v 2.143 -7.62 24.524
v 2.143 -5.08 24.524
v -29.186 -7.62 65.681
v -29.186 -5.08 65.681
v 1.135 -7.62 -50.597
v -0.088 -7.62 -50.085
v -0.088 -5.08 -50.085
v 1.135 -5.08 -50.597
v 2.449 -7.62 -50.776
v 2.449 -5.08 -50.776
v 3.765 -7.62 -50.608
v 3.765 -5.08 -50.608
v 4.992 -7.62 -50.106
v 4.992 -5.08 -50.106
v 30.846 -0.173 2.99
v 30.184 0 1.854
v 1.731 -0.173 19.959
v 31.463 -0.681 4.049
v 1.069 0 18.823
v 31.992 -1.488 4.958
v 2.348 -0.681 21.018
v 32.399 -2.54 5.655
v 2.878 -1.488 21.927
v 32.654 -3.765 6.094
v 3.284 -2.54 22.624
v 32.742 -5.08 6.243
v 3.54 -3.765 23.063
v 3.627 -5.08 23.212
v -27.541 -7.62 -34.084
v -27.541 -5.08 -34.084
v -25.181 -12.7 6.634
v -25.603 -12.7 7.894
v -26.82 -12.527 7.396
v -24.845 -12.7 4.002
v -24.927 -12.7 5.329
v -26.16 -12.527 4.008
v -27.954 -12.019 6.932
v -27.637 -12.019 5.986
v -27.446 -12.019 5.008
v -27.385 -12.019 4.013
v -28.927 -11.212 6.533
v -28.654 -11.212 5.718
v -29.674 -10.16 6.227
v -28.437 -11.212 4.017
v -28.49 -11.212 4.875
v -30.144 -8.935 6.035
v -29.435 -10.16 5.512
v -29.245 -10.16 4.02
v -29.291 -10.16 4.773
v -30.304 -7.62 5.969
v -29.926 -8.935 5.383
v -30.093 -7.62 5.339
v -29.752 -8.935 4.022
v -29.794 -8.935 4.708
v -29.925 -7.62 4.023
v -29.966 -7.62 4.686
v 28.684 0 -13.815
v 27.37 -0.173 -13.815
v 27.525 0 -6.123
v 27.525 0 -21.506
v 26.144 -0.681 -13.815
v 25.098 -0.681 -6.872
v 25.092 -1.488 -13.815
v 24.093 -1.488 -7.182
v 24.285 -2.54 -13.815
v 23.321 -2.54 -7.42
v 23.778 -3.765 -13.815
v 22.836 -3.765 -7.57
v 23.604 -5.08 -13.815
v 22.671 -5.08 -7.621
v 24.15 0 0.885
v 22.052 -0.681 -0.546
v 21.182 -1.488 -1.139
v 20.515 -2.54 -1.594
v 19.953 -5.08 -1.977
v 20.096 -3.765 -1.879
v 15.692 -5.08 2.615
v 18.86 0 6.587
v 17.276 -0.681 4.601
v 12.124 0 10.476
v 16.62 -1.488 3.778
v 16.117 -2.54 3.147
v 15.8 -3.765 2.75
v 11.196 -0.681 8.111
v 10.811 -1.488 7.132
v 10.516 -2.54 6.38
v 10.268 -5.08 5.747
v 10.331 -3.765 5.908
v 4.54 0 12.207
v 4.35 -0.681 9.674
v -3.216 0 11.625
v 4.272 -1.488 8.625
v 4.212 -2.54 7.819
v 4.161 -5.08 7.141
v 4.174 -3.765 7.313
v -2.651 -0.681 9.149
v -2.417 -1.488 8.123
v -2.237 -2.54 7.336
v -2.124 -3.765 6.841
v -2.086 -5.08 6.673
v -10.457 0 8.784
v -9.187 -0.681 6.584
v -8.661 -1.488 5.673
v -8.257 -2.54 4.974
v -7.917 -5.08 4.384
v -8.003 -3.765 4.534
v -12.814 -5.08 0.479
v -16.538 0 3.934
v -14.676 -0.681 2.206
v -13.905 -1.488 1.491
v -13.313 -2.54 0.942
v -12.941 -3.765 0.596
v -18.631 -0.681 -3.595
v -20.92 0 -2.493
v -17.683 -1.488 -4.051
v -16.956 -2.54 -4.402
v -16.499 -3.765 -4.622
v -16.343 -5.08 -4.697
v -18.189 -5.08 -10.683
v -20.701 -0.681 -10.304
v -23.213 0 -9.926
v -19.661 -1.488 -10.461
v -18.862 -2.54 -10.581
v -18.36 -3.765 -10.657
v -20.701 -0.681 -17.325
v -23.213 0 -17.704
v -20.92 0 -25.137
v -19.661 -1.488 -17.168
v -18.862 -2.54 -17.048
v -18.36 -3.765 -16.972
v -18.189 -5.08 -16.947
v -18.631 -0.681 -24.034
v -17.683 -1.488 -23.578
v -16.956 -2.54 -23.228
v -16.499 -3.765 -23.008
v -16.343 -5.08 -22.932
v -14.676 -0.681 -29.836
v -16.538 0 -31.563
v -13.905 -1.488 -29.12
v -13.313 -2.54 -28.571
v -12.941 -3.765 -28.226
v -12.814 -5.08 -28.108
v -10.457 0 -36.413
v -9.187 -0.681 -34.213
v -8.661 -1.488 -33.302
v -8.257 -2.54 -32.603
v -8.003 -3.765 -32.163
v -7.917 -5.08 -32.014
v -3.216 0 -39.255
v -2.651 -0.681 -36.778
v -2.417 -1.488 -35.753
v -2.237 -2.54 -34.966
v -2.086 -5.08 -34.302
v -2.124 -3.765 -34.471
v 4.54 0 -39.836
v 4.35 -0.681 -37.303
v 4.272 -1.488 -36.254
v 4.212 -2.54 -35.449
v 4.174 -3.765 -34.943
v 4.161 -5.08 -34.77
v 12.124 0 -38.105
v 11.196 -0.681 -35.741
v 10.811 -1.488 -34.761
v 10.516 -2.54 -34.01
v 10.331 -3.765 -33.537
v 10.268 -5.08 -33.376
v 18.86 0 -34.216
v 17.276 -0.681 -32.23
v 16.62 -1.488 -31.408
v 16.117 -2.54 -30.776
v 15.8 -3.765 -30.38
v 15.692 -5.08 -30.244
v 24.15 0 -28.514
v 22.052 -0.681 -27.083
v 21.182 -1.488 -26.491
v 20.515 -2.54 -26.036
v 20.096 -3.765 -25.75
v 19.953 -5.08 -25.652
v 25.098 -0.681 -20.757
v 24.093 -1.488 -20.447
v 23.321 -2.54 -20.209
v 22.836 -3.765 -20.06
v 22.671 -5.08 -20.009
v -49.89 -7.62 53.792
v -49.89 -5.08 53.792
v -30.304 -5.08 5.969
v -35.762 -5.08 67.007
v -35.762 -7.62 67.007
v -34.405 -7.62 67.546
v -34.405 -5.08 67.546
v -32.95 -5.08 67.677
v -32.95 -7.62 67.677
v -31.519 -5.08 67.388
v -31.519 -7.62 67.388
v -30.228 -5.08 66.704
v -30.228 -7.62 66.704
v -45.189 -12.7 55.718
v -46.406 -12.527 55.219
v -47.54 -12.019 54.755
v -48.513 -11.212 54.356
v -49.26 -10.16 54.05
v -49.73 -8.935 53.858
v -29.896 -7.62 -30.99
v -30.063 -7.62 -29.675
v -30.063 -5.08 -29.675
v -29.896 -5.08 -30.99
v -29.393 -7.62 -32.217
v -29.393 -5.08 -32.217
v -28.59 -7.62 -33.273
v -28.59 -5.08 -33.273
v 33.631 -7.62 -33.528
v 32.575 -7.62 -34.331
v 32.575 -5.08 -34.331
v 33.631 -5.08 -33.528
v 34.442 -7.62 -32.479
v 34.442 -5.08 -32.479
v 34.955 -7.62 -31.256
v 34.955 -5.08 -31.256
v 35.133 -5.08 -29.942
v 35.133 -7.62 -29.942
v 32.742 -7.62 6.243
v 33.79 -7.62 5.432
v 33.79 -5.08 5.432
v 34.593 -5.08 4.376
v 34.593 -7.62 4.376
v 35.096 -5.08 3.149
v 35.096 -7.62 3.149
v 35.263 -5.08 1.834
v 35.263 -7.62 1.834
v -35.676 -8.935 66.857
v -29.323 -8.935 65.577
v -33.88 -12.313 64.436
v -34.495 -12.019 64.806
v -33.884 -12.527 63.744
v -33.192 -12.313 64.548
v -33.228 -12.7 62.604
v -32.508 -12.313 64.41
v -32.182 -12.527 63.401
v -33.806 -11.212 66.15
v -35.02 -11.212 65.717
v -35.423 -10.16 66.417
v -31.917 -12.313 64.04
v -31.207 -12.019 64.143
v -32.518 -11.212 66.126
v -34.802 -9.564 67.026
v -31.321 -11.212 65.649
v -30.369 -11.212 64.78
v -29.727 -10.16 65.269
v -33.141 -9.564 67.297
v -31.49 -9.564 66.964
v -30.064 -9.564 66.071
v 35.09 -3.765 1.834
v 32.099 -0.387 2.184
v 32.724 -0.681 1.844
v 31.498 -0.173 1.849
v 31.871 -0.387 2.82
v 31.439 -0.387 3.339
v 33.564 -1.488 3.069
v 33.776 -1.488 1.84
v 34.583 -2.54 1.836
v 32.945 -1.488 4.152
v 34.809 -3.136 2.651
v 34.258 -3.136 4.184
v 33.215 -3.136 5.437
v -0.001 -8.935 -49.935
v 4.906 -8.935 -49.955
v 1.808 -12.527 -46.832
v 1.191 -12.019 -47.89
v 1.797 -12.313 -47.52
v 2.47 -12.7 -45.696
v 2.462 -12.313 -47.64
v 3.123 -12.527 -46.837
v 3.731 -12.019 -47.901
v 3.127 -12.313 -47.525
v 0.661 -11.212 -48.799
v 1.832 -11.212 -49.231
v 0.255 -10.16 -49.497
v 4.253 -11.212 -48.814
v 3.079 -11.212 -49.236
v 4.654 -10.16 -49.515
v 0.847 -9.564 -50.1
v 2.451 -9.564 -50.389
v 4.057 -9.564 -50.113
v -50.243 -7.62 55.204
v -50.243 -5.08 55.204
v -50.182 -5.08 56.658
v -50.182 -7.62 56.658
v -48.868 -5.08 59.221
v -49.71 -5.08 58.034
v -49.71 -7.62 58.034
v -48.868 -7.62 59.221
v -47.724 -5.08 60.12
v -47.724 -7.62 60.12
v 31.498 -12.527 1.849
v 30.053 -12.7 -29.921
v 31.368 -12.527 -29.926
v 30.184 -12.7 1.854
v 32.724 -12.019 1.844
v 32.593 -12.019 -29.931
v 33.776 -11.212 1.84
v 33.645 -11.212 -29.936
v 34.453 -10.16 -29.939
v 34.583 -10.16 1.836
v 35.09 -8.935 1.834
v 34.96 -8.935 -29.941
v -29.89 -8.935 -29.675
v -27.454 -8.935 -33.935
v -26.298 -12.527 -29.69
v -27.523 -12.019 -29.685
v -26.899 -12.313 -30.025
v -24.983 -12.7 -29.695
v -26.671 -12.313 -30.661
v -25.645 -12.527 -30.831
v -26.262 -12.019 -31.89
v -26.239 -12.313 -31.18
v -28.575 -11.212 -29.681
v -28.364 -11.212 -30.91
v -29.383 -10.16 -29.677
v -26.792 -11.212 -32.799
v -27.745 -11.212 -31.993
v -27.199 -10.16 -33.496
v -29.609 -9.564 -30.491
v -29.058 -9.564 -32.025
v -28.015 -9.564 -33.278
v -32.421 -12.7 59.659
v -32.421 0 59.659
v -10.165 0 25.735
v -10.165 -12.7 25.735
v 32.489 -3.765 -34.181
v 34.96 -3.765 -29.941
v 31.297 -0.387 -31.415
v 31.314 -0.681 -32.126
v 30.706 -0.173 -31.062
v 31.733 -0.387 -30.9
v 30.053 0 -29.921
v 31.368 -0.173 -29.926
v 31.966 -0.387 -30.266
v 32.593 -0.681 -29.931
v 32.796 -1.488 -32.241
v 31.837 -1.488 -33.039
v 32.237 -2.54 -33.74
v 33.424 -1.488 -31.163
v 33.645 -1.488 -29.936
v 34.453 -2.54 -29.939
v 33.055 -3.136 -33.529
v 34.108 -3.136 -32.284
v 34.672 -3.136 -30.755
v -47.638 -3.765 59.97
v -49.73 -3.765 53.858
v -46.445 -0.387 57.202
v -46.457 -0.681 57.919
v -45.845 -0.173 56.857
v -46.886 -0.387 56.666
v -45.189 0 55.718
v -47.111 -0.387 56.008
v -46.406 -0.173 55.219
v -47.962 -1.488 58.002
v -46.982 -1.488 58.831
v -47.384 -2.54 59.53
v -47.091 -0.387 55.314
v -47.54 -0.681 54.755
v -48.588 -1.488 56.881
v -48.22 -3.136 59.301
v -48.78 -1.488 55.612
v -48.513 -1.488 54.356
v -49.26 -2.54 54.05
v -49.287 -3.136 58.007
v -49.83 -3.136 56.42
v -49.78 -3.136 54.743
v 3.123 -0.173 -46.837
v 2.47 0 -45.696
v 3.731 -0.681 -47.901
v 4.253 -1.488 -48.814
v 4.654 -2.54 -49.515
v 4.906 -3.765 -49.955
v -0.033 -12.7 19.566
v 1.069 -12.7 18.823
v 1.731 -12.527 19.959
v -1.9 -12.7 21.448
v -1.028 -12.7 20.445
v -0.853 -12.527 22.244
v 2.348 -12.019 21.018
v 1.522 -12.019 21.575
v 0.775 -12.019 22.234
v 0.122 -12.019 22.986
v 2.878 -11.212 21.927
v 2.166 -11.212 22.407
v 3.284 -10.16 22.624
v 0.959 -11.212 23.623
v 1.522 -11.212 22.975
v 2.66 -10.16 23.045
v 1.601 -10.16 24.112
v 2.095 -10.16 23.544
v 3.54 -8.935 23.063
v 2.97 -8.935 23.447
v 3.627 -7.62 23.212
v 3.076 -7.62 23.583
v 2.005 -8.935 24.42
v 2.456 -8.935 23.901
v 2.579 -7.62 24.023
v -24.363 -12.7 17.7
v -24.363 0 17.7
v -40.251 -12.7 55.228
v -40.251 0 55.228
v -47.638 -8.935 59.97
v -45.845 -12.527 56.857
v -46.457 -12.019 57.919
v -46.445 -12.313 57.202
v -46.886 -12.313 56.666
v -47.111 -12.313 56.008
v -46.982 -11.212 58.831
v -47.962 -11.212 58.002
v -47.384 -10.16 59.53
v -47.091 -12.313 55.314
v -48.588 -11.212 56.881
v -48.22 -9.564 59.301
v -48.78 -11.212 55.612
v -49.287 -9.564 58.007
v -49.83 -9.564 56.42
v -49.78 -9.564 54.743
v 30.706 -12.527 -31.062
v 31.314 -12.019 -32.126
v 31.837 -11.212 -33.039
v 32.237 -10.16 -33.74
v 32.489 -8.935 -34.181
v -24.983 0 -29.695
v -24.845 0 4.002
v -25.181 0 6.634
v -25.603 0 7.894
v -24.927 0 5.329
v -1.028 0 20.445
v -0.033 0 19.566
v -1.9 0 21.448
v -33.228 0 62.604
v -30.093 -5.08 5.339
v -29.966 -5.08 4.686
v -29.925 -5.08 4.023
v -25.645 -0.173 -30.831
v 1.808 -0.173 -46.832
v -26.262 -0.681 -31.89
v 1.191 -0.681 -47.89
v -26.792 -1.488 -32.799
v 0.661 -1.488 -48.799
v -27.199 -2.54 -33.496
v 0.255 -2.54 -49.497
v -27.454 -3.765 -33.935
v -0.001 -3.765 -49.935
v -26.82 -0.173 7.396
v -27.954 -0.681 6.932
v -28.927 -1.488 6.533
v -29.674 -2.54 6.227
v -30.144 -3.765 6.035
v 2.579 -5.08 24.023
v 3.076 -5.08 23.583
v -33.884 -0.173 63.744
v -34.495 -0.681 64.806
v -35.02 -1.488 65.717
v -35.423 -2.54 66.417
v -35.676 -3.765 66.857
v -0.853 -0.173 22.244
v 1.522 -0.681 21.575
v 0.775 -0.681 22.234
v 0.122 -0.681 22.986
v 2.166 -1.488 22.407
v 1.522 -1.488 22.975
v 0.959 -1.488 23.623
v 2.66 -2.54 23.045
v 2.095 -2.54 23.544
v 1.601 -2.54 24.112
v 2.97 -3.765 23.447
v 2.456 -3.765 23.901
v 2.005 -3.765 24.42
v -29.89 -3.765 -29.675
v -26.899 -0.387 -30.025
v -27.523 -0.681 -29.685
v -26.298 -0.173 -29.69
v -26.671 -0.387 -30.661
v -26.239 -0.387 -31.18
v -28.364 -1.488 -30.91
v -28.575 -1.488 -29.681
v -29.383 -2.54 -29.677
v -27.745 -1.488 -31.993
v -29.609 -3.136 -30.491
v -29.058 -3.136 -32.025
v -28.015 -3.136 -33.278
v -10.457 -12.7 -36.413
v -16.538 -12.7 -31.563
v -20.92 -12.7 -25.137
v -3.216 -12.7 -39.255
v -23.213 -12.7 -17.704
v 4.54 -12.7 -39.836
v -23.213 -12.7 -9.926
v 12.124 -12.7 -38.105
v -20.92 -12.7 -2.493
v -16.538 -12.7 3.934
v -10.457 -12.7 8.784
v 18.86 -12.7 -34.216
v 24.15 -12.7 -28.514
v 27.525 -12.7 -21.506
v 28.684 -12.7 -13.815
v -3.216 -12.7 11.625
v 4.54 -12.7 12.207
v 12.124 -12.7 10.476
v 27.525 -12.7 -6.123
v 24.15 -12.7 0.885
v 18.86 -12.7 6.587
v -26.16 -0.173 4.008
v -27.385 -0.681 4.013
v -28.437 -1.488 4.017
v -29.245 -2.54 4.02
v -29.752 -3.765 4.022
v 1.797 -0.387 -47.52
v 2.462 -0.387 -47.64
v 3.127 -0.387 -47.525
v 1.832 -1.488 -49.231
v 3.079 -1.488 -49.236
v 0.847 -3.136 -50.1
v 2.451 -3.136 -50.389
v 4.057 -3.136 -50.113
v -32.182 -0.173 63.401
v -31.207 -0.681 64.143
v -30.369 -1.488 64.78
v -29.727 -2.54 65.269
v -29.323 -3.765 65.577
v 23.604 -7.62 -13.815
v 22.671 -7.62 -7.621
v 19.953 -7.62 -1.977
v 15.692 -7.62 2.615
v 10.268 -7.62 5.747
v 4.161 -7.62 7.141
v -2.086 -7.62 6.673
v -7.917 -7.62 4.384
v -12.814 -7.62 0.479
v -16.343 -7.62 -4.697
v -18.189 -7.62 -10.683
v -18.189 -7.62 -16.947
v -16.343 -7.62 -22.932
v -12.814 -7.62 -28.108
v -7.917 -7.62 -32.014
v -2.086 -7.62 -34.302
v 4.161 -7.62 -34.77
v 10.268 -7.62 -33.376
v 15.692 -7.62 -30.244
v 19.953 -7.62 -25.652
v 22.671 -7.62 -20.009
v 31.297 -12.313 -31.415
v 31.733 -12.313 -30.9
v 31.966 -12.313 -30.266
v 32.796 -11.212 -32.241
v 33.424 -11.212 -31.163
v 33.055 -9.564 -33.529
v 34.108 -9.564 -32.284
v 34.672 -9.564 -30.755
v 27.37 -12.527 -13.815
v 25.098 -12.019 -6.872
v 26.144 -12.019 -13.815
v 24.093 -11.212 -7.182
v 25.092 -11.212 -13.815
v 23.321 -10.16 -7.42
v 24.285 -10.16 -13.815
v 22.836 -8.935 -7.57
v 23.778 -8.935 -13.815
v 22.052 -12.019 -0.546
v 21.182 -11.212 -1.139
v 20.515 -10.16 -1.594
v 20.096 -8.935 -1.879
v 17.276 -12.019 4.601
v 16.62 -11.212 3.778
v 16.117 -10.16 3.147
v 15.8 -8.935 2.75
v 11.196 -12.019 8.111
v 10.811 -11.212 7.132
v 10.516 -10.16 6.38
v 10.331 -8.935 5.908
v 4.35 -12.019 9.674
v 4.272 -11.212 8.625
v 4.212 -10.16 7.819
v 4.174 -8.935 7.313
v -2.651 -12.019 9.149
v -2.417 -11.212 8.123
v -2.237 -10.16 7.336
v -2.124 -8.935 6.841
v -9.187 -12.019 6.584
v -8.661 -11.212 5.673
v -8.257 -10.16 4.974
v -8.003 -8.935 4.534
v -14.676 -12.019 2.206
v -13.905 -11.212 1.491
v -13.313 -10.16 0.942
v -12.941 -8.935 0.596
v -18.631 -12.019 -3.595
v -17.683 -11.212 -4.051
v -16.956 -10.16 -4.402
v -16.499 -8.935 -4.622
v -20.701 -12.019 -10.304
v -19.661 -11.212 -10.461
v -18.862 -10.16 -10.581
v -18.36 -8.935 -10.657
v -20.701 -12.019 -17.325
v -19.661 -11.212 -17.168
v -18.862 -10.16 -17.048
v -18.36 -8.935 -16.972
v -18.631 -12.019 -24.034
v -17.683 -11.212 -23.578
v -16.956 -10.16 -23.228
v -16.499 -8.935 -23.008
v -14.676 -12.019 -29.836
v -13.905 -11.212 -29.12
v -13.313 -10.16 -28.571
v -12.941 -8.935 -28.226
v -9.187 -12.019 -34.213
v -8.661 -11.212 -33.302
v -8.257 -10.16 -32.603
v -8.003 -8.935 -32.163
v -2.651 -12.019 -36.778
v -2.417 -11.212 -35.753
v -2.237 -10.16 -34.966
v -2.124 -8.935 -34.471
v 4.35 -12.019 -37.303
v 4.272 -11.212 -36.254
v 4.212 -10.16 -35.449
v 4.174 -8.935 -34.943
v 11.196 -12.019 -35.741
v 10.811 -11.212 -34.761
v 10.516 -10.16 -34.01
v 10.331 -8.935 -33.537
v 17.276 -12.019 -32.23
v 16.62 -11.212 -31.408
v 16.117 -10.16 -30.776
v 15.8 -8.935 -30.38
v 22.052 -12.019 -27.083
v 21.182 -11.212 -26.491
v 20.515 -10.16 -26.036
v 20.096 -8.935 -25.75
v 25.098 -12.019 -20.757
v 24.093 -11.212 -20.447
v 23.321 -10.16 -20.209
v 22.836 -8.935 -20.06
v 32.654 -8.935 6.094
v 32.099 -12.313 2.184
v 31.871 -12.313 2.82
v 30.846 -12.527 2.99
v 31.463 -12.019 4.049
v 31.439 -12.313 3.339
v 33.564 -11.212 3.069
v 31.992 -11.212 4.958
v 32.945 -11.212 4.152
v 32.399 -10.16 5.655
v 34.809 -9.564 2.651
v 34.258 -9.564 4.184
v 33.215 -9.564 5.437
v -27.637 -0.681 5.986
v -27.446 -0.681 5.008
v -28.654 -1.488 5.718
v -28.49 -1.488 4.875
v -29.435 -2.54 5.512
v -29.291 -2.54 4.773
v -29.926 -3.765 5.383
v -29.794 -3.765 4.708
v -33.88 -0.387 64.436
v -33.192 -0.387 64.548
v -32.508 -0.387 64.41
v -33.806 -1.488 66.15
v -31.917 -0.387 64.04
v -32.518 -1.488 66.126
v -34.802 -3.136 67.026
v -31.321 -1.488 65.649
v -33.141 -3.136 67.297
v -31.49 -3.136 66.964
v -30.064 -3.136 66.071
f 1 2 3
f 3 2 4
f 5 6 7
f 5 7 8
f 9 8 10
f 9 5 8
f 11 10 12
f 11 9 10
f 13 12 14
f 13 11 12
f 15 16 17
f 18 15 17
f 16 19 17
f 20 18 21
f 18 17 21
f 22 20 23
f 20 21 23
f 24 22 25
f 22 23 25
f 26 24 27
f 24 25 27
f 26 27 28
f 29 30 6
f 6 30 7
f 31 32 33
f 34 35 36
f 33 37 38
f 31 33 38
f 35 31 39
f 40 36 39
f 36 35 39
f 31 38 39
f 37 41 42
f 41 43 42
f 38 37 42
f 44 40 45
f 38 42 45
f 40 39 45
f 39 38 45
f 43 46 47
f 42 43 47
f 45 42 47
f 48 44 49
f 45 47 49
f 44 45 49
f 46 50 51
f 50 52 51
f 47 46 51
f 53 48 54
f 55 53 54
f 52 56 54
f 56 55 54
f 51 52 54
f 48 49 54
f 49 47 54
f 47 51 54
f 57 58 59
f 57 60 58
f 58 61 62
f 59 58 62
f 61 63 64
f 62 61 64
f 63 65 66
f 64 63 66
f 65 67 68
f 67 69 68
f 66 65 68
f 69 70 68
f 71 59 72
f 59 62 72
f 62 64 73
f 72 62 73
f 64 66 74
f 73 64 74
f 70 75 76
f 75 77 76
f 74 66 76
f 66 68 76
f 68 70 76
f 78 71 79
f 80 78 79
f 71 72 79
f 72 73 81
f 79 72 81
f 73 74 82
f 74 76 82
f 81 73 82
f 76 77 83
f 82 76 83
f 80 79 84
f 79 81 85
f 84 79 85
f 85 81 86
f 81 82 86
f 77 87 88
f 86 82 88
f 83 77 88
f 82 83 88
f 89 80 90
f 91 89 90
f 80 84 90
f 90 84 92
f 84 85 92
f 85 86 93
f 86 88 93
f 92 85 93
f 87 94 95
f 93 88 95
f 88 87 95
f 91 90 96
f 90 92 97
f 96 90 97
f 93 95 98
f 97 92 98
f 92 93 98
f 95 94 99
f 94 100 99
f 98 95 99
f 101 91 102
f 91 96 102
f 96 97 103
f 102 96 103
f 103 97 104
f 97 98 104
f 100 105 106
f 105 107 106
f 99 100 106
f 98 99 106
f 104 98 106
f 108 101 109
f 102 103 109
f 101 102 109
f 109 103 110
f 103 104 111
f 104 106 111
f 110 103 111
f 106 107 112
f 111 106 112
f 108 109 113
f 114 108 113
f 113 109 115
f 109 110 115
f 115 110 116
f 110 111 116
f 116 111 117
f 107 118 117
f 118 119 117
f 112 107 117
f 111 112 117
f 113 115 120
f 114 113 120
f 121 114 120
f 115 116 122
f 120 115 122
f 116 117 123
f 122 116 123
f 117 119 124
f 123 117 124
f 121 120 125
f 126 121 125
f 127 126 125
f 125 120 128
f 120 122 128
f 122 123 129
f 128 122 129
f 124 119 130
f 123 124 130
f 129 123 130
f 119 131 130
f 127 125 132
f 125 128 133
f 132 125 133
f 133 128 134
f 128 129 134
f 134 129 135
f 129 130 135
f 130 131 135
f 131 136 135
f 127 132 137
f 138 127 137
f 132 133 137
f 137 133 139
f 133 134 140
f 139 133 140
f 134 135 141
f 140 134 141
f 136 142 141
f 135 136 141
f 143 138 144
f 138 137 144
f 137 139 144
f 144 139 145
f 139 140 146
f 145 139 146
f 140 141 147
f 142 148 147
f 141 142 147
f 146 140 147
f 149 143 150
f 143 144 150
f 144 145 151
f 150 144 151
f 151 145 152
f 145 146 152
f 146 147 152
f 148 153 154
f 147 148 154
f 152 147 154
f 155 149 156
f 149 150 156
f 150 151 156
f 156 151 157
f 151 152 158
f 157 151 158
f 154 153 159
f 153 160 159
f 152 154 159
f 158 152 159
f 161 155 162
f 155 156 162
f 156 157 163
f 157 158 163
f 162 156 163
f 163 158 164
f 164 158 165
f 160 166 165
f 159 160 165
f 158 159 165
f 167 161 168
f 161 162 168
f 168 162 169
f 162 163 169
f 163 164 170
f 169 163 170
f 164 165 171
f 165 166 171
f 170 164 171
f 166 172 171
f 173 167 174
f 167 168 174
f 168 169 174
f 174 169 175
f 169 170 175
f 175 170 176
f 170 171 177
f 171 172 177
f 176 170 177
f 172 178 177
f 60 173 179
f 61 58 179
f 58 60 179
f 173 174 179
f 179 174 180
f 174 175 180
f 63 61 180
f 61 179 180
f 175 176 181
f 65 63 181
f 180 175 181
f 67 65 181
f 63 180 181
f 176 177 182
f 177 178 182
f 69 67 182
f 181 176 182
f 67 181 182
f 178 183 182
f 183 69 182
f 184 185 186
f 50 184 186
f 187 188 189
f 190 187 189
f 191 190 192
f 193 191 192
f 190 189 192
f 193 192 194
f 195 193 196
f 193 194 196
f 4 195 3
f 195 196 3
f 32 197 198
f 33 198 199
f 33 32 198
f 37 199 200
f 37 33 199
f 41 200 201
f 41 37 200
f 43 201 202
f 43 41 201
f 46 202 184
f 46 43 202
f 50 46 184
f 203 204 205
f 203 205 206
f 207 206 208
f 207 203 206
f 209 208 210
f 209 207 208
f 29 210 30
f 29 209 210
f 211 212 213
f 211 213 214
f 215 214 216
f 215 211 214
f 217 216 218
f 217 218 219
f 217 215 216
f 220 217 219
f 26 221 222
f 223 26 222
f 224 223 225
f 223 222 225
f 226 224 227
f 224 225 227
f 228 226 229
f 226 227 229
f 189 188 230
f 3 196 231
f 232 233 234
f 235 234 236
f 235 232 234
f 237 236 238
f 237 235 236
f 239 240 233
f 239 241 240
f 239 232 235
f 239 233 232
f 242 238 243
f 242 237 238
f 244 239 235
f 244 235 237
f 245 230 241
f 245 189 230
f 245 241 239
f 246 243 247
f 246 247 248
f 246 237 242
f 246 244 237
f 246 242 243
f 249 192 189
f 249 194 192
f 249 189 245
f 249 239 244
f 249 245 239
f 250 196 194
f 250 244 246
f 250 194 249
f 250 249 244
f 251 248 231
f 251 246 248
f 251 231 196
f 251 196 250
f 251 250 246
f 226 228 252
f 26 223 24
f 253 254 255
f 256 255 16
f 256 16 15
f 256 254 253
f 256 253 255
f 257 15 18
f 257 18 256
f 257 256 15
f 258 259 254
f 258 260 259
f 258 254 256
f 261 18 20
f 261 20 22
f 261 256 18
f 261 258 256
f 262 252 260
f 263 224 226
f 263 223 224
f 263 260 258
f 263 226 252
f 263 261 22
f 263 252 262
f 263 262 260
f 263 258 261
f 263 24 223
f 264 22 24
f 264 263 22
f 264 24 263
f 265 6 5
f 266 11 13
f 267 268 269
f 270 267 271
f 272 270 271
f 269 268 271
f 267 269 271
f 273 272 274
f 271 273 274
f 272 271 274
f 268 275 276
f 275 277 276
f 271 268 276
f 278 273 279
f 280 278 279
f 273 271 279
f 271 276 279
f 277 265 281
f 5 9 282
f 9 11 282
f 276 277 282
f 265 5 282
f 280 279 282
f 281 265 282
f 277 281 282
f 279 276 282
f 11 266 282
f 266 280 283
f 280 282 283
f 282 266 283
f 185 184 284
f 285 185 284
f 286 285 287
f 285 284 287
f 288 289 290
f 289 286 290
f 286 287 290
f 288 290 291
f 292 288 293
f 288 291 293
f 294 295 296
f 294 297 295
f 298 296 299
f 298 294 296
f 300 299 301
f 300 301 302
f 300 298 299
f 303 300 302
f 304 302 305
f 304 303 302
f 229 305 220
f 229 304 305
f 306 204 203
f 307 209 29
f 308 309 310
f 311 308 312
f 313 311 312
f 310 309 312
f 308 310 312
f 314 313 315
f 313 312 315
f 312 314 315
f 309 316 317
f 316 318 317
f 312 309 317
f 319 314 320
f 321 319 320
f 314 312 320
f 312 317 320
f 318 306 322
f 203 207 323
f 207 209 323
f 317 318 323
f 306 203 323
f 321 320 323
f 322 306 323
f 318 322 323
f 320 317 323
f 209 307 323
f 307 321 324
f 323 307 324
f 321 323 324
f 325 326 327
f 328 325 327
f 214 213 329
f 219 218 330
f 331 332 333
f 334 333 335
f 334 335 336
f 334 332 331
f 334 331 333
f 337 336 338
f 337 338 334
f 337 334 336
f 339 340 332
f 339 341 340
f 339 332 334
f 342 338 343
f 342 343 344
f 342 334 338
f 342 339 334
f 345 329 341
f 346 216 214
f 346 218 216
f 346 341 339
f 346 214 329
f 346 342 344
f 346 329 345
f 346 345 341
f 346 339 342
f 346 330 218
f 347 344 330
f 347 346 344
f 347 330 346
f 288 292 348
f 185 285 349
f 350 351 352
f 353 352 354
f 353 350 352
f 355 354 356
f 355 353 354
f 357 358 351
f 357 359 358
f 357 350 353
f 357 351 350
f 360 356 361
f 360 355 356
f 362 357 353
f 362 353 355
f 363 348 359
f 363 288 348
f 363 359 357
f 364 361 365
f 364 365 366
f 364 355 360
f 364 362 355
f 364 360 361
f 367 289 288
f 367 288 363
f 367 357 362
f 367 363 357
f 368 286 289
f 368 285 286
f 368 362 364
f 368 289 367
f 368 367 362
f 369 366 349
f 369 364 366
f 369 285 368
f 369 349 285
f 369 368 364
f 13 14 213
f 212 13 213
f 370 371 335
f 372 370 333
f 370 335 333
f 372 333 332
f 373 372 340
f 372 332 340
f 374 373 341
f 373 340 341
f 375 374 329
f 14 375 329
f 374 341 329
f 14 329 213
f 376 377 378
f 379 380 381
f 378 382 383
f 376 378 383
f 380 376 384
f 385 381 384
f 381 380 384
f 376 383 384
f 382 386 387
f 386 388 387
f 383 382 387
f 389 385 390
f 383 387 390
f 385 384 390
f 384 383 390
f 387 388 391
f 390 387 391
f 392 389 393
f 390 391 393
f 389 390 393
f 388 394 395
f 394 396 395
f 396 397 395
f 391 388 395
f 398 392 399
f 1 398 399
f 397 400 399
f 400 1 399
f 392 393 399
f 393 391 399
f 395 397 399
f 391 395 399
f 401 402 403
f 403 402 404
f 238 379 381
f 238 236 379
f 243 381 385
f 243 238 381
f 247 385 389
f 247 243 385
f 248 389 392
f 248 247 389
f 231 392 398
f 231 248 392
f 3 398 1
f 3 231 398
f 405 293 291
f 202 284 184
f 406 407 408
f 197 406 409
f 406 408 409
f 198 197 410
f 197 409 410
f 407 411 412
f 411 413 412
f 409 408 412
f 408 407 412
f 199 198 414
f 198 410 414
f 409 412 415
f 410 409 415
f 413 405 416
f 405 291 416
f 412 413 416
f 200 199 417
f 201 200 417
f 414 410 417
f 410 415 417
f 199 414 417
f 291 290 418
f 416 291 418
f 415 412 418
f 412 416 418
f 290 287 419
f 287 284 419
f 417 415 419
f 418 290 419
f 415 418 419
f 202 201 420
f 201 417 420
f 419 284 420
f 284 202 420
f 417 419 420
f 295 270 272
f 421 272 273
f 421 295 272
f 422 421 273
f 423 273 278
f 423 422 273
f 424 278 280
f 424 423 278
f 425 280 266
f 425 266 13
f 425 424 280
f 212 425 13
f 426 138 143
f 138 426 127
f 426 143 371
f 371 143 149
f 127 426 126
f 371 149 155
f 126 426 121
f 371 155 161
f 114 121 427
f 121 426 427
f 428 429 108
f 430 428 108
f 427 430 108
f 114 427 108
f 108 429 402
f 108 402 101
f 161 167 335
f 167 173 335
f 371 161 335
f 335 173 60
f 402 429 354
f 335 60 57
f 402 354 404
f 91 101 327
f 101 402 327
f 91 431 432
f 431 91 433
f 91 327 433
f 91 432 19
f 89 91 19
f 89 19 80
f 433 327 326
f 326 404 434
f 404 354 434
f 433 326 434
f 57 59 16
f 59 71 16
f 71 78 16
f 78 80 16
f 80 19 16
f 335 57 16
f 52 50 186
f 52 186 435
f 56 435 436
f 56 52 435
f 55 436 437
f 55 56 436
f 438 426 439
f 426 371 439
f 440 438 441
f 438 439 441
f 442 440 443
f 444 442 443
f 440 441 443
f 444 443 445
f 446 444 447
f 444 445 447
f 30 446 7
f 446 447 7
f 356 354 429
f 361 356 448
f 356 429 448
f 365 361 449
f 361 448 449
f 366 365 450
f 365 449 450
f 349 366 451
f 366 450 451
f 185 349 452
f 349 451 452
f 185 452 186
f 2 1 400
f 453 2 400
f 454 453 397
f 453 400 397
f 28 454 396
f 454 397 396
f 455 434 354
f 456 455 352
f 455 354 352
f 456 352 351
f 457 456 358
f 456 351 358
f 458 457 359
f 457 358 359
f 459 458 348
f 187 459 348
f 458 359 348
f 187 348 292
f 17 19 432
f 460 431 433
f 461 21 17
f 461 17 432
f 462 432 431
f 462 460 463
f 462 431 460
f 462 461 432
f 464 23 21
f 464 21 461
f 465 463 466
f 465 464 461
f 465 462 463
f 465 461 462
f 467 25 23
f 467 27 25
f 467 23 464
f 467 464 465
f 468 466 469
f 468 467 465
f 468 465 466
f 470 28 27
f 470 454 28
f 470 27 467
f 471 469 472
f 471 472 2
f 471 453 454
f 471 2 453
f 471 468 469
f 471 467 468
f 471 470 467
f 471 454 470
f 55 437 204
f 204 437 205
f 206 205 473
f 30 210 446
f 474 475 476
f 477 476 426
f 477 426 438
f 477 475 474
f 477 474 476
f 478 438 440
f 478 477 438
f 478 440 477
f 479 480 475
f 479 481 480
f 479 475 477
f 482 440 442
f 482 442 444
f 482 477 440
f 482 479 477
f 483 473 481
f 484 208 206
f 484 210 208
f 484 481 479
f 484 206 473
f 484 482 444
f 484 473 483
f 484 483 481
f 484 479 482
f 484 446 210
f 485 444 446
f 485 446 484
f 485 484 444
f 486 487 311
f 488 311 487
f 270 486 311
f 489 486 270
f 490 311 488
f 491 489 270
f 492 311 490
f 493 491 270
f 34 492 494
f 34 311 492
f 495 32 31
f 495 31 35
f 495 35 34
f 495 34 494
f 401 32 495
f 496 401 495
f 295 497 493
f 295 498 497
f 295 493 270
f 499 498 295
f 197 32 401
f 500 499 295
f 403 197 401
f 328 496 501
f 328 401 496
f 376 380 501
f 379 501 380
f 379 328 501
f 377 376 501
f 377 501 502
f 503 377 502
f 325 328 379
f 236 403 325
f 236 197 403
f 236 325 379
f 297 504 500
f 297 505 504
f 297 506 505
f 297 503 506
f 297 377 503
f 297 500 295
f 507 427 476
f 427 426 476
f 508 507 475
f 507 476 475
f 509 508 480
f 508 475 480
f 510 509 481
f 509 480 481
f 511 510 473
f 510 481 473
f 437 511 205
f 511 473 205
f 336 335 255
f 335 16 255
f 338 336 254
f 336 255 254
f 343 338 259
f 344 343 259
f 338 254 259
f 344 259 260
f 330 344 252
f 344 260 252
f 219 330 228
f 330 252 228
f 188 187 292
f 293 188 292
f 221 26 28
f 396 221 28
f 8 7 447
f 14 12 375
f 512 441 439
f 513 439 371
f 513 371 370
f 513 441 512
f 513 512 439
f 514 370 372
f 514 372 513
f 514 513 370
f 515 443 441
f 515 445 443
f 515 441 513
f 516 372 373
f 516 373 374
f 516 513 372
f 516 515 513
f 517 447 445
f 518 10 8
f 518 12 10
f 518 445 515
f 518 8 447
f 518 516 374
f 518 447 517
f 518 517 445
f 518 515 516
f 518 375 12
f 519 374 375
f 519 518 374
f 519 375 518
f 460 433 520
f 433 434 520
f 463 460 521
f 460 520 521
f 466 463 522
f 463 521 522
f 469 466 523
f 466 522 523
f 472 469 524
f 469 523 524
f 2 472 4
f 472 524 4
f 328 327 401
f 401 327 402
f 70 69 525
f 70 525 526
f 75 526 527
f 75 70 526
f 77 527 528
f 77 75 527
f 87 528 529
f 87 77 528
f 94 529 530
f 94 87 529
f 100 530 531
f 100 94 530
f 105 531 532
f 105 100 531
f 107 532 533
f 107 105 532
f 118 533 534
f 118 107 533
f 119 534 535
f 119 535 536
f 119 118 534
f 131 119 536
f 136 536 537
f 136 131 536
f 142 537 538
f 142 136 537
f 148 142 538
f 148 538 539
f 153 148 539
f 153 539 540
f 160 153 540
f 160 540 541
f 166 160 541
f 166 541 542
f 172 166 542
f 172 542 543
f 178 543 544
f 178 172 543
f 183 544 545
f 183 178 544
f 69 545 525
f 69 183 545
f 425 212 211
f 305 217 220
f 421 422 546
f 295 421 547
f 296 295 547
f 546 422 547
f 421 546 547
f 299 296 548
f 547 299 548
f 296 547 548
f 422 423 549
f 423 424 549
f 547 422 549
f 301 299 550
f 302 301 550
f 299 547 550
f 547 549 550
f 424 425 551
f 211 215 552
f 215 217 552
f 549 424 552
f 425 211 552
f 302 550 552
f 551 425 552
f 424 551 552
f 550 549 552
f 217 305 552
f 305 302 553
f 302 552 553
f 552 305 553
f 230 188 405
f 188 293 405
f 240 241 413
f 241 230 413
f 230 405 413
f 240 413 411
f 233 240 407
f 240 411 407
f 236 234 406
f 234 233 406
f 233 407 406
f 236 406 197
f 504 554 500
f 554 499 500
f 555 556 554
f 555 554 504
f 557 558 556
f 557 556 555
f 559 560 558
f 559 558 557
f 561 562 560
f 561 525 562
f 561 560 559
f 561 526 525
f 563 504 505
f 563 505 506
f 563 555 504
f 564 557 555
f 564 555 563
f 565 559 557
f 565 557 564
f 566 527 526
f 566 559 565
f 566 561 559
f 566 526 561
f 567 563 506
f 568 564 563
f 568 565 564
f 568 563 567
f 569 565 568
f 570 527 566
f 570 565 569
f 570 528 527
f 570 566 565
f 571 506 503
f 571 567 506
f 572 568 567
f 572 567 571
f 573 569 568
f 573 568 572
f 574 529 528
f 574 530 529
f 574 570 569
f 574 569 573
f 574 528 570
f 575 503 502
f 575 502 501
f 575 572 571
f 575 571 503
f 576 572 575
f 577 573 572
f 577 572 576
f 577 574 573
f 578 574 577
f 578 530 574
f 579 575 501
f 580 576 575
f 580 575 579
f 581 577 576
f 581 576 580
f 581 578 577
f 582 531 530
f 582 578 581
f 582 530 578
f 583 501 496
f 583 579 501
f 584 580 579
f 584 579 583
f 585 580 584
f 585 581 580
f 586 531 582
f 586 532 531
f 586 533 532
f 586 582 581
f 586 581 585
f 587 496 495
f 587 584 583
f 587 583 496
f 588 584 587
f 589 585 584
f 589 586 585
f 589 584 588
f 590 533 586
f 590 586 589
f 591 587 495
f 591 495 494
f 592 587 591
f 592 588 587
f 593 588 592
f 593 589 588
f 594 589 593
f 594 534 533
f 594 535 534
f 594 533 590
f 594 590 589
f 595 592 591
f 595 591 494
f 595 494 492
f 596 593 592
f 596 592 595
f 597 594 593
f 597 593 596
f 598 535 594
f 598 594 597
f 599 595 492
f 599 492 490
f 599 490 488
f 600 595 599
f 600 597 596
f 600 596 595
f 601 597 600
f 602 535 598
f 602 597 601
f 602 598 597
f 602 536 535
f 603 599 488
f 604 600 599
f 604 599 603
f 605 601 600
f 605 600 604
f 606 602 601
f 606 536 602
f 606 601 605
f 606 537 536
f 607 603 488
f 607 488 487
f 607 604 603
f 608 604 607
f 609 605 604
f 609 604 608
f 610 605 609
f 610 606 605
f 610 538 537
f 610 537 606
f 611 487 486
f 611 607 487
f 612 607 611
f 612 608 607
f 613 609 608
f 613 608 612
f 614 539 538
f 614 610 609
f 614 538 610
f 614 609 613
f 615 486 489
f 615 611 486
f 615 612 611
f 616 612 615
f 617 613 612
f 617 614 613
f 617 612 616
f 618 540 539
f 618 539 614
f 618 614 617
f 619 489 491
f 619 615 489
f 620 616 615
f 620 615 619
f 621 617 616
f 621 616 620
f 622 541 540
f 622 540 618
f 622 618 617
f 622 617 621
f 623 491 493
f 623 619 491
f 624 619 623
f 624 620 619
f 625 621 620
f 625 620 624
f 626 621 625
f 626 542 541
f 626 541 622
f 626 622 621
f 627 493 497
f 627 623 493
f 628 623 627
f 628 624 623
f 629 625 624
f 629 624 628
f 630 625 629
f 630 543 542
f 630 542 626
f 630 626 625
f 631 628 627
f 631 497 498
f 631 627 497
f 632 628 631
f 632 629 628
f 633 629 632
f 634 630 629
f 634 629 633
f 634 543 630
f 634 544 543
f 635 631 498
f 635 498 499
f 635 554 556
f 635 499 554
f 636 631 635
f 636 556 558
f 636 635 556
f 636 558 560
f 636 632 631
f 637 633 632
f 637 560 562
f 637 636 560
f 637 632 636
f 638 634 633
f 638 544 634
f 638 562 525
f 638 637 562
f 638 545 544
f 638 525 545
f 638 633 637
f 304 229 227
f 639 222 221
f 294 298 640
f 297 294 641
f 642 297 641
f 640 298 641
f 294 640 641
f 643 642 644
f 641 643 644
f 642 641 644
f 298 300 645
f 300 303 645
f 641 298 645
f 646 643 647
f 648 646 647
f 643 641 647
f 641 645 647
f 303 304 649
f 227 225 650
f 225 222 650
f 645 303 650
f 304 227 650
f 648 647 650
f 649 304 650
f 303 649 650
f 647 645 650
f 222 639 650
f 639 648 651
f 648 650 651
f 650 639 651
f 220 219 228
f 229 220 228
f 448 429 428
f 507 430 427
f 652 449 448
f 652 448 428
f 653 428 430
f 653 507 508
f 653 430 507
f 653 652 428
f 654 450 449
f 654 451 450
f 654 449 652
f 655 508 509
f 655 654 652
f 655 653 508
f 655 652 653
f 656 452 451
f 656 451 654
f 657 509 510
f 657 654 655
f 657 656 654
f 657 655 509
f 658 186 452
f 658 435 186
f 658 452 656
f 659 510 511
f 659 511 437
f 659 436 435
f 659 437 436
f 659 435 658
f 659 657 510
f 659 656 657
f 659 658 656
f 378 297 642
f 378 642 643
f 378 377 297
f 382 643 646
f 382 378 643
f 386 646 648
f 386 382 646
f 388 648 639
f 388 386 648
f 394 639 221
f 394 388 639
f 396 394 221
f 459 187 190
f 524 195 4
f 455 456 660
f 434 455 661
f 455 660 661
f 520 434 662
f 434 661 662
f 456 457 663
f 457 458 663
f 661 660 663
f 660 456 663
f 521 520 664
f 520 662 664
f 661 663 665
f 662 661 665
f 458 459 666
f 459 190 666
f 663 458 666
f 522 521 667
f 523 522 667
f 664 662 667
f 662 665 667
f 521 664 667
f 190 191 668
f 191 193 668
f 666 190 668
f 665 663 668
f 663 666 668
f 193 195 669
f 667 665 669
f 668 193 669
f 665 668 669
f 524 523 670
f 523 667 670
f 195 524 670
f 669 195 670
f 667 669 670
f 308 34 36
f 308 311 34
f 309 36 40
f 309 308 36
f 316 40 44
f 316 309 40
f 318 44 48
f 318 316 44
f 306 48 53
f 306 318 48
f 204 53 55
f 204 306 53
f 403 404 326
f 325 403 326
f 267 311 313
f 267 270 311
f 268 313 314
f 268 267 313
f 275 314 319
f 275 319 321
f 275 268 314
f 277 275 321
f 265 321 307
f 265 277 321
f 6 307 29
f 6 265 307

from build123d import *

# Parameters (mm, degrees)
F0_R     = 21.014231477
F1_DEPTH = 12.7
F2_F1_R  = 5.08
F2_F2_R  = 5.08


with BuildPart() as f1:
    # F0 (on Front) → F1 (new body)
    with BuildSketch(Plane.XZ):
        Polygon((-51.5739838451, 57.903360525), (-29.9211297043, 5.0337655893), (2.754318782, 23.7208167973), (-31.8911919502, 69.2358331578), align=None)
        Polygon((-32.4213020707, 59.6586255942), (-10.1648603382, 25.7348876013), (-24.3627145166, 17.7003582495), (-40.2510521891, 55.227790036), align=None, mode=Mode.SUBTRACT)
        Polygon((-29.9211297043, 5.0337655893), (-30.0753928796, -32.6075284839), (2.4457924315, -51.5617713492), (35.1212409178, -32.8747201412), (35.2755040931, 4.766573932), (2.754318782, 23.7208167973), align=None)
        with Locations((2.5902532507, -13.814676553)):
            Circle(F0_R, mode=Mode.SUBTRACT)
    extrude(amount=F1_DEPTH)

    # F2: fillet of radius 5.08 on 22 edges, made by hand

    # F2_f1
    f2_f1_edges = [f1.edges().sort_by_distance(p)[0] for p in [
        (-29.9211297043, -6.35, 5.0337655893),
        (2.754318782, -6.35, 23.7208167973),
    ]]
    fillet(f2_f1_edges, radius=F2_F1_R)

    # F2_f2
    f2_f2_edges = [f1.edges().sort_by_distance(p)[0] for p in [
        (-18.4239782263, -12.7, -13.814676553),
        (-30.0753928796, -6.35, -32.6075284839),
        (-30.0003324711, 0, -14.2922636402),
        (-30.0003324711, -12.7, -14.2922636402),
        (2.4457924315, -6.35, -51.5617713492),
        (-13.8148002241, 0, -42.0846499165),
        (-13.8148002241, -12.7, -42.0846499165),
        (35.1212409178, -6.35, -32.8747201412),
        (18.7835166747, 0, -42.2182457452),
        (18.7835166747, -12.7, -42.2182457452),
        (35.2755040931, -6.35, 4.766573932),
        (35.1983725055, 0, -14.0540731046),
        (35.1983725055, -12.7, -14.0540731046),
        (19.4511663483, 0, 13.9894339824),
        (19.4511663483, -12.7, 13.9894339824),
        (-31.8911919502, -6.35, 69.2358331578),
        (-51.5739838451, -6.35, 57.903360525),
        (-41.7325878977, 0, 63.5695968414),
        (-41.7325878977, -12.7, 63.5695968414),
        (-18.4239782263, 0, -13.814676553),
        (2.8201605652, -12.7, 23.7952939078),
        (2.8201605652, 0, 23.7952939078),
        (-30.0188752401, -12.7, 5.0147331632),
        (-30.0188752401, 0, 5.0147331632),
    ]]
    fillet(f2_f2_edges, radius=F2_F2_R)


solid = f1.part
